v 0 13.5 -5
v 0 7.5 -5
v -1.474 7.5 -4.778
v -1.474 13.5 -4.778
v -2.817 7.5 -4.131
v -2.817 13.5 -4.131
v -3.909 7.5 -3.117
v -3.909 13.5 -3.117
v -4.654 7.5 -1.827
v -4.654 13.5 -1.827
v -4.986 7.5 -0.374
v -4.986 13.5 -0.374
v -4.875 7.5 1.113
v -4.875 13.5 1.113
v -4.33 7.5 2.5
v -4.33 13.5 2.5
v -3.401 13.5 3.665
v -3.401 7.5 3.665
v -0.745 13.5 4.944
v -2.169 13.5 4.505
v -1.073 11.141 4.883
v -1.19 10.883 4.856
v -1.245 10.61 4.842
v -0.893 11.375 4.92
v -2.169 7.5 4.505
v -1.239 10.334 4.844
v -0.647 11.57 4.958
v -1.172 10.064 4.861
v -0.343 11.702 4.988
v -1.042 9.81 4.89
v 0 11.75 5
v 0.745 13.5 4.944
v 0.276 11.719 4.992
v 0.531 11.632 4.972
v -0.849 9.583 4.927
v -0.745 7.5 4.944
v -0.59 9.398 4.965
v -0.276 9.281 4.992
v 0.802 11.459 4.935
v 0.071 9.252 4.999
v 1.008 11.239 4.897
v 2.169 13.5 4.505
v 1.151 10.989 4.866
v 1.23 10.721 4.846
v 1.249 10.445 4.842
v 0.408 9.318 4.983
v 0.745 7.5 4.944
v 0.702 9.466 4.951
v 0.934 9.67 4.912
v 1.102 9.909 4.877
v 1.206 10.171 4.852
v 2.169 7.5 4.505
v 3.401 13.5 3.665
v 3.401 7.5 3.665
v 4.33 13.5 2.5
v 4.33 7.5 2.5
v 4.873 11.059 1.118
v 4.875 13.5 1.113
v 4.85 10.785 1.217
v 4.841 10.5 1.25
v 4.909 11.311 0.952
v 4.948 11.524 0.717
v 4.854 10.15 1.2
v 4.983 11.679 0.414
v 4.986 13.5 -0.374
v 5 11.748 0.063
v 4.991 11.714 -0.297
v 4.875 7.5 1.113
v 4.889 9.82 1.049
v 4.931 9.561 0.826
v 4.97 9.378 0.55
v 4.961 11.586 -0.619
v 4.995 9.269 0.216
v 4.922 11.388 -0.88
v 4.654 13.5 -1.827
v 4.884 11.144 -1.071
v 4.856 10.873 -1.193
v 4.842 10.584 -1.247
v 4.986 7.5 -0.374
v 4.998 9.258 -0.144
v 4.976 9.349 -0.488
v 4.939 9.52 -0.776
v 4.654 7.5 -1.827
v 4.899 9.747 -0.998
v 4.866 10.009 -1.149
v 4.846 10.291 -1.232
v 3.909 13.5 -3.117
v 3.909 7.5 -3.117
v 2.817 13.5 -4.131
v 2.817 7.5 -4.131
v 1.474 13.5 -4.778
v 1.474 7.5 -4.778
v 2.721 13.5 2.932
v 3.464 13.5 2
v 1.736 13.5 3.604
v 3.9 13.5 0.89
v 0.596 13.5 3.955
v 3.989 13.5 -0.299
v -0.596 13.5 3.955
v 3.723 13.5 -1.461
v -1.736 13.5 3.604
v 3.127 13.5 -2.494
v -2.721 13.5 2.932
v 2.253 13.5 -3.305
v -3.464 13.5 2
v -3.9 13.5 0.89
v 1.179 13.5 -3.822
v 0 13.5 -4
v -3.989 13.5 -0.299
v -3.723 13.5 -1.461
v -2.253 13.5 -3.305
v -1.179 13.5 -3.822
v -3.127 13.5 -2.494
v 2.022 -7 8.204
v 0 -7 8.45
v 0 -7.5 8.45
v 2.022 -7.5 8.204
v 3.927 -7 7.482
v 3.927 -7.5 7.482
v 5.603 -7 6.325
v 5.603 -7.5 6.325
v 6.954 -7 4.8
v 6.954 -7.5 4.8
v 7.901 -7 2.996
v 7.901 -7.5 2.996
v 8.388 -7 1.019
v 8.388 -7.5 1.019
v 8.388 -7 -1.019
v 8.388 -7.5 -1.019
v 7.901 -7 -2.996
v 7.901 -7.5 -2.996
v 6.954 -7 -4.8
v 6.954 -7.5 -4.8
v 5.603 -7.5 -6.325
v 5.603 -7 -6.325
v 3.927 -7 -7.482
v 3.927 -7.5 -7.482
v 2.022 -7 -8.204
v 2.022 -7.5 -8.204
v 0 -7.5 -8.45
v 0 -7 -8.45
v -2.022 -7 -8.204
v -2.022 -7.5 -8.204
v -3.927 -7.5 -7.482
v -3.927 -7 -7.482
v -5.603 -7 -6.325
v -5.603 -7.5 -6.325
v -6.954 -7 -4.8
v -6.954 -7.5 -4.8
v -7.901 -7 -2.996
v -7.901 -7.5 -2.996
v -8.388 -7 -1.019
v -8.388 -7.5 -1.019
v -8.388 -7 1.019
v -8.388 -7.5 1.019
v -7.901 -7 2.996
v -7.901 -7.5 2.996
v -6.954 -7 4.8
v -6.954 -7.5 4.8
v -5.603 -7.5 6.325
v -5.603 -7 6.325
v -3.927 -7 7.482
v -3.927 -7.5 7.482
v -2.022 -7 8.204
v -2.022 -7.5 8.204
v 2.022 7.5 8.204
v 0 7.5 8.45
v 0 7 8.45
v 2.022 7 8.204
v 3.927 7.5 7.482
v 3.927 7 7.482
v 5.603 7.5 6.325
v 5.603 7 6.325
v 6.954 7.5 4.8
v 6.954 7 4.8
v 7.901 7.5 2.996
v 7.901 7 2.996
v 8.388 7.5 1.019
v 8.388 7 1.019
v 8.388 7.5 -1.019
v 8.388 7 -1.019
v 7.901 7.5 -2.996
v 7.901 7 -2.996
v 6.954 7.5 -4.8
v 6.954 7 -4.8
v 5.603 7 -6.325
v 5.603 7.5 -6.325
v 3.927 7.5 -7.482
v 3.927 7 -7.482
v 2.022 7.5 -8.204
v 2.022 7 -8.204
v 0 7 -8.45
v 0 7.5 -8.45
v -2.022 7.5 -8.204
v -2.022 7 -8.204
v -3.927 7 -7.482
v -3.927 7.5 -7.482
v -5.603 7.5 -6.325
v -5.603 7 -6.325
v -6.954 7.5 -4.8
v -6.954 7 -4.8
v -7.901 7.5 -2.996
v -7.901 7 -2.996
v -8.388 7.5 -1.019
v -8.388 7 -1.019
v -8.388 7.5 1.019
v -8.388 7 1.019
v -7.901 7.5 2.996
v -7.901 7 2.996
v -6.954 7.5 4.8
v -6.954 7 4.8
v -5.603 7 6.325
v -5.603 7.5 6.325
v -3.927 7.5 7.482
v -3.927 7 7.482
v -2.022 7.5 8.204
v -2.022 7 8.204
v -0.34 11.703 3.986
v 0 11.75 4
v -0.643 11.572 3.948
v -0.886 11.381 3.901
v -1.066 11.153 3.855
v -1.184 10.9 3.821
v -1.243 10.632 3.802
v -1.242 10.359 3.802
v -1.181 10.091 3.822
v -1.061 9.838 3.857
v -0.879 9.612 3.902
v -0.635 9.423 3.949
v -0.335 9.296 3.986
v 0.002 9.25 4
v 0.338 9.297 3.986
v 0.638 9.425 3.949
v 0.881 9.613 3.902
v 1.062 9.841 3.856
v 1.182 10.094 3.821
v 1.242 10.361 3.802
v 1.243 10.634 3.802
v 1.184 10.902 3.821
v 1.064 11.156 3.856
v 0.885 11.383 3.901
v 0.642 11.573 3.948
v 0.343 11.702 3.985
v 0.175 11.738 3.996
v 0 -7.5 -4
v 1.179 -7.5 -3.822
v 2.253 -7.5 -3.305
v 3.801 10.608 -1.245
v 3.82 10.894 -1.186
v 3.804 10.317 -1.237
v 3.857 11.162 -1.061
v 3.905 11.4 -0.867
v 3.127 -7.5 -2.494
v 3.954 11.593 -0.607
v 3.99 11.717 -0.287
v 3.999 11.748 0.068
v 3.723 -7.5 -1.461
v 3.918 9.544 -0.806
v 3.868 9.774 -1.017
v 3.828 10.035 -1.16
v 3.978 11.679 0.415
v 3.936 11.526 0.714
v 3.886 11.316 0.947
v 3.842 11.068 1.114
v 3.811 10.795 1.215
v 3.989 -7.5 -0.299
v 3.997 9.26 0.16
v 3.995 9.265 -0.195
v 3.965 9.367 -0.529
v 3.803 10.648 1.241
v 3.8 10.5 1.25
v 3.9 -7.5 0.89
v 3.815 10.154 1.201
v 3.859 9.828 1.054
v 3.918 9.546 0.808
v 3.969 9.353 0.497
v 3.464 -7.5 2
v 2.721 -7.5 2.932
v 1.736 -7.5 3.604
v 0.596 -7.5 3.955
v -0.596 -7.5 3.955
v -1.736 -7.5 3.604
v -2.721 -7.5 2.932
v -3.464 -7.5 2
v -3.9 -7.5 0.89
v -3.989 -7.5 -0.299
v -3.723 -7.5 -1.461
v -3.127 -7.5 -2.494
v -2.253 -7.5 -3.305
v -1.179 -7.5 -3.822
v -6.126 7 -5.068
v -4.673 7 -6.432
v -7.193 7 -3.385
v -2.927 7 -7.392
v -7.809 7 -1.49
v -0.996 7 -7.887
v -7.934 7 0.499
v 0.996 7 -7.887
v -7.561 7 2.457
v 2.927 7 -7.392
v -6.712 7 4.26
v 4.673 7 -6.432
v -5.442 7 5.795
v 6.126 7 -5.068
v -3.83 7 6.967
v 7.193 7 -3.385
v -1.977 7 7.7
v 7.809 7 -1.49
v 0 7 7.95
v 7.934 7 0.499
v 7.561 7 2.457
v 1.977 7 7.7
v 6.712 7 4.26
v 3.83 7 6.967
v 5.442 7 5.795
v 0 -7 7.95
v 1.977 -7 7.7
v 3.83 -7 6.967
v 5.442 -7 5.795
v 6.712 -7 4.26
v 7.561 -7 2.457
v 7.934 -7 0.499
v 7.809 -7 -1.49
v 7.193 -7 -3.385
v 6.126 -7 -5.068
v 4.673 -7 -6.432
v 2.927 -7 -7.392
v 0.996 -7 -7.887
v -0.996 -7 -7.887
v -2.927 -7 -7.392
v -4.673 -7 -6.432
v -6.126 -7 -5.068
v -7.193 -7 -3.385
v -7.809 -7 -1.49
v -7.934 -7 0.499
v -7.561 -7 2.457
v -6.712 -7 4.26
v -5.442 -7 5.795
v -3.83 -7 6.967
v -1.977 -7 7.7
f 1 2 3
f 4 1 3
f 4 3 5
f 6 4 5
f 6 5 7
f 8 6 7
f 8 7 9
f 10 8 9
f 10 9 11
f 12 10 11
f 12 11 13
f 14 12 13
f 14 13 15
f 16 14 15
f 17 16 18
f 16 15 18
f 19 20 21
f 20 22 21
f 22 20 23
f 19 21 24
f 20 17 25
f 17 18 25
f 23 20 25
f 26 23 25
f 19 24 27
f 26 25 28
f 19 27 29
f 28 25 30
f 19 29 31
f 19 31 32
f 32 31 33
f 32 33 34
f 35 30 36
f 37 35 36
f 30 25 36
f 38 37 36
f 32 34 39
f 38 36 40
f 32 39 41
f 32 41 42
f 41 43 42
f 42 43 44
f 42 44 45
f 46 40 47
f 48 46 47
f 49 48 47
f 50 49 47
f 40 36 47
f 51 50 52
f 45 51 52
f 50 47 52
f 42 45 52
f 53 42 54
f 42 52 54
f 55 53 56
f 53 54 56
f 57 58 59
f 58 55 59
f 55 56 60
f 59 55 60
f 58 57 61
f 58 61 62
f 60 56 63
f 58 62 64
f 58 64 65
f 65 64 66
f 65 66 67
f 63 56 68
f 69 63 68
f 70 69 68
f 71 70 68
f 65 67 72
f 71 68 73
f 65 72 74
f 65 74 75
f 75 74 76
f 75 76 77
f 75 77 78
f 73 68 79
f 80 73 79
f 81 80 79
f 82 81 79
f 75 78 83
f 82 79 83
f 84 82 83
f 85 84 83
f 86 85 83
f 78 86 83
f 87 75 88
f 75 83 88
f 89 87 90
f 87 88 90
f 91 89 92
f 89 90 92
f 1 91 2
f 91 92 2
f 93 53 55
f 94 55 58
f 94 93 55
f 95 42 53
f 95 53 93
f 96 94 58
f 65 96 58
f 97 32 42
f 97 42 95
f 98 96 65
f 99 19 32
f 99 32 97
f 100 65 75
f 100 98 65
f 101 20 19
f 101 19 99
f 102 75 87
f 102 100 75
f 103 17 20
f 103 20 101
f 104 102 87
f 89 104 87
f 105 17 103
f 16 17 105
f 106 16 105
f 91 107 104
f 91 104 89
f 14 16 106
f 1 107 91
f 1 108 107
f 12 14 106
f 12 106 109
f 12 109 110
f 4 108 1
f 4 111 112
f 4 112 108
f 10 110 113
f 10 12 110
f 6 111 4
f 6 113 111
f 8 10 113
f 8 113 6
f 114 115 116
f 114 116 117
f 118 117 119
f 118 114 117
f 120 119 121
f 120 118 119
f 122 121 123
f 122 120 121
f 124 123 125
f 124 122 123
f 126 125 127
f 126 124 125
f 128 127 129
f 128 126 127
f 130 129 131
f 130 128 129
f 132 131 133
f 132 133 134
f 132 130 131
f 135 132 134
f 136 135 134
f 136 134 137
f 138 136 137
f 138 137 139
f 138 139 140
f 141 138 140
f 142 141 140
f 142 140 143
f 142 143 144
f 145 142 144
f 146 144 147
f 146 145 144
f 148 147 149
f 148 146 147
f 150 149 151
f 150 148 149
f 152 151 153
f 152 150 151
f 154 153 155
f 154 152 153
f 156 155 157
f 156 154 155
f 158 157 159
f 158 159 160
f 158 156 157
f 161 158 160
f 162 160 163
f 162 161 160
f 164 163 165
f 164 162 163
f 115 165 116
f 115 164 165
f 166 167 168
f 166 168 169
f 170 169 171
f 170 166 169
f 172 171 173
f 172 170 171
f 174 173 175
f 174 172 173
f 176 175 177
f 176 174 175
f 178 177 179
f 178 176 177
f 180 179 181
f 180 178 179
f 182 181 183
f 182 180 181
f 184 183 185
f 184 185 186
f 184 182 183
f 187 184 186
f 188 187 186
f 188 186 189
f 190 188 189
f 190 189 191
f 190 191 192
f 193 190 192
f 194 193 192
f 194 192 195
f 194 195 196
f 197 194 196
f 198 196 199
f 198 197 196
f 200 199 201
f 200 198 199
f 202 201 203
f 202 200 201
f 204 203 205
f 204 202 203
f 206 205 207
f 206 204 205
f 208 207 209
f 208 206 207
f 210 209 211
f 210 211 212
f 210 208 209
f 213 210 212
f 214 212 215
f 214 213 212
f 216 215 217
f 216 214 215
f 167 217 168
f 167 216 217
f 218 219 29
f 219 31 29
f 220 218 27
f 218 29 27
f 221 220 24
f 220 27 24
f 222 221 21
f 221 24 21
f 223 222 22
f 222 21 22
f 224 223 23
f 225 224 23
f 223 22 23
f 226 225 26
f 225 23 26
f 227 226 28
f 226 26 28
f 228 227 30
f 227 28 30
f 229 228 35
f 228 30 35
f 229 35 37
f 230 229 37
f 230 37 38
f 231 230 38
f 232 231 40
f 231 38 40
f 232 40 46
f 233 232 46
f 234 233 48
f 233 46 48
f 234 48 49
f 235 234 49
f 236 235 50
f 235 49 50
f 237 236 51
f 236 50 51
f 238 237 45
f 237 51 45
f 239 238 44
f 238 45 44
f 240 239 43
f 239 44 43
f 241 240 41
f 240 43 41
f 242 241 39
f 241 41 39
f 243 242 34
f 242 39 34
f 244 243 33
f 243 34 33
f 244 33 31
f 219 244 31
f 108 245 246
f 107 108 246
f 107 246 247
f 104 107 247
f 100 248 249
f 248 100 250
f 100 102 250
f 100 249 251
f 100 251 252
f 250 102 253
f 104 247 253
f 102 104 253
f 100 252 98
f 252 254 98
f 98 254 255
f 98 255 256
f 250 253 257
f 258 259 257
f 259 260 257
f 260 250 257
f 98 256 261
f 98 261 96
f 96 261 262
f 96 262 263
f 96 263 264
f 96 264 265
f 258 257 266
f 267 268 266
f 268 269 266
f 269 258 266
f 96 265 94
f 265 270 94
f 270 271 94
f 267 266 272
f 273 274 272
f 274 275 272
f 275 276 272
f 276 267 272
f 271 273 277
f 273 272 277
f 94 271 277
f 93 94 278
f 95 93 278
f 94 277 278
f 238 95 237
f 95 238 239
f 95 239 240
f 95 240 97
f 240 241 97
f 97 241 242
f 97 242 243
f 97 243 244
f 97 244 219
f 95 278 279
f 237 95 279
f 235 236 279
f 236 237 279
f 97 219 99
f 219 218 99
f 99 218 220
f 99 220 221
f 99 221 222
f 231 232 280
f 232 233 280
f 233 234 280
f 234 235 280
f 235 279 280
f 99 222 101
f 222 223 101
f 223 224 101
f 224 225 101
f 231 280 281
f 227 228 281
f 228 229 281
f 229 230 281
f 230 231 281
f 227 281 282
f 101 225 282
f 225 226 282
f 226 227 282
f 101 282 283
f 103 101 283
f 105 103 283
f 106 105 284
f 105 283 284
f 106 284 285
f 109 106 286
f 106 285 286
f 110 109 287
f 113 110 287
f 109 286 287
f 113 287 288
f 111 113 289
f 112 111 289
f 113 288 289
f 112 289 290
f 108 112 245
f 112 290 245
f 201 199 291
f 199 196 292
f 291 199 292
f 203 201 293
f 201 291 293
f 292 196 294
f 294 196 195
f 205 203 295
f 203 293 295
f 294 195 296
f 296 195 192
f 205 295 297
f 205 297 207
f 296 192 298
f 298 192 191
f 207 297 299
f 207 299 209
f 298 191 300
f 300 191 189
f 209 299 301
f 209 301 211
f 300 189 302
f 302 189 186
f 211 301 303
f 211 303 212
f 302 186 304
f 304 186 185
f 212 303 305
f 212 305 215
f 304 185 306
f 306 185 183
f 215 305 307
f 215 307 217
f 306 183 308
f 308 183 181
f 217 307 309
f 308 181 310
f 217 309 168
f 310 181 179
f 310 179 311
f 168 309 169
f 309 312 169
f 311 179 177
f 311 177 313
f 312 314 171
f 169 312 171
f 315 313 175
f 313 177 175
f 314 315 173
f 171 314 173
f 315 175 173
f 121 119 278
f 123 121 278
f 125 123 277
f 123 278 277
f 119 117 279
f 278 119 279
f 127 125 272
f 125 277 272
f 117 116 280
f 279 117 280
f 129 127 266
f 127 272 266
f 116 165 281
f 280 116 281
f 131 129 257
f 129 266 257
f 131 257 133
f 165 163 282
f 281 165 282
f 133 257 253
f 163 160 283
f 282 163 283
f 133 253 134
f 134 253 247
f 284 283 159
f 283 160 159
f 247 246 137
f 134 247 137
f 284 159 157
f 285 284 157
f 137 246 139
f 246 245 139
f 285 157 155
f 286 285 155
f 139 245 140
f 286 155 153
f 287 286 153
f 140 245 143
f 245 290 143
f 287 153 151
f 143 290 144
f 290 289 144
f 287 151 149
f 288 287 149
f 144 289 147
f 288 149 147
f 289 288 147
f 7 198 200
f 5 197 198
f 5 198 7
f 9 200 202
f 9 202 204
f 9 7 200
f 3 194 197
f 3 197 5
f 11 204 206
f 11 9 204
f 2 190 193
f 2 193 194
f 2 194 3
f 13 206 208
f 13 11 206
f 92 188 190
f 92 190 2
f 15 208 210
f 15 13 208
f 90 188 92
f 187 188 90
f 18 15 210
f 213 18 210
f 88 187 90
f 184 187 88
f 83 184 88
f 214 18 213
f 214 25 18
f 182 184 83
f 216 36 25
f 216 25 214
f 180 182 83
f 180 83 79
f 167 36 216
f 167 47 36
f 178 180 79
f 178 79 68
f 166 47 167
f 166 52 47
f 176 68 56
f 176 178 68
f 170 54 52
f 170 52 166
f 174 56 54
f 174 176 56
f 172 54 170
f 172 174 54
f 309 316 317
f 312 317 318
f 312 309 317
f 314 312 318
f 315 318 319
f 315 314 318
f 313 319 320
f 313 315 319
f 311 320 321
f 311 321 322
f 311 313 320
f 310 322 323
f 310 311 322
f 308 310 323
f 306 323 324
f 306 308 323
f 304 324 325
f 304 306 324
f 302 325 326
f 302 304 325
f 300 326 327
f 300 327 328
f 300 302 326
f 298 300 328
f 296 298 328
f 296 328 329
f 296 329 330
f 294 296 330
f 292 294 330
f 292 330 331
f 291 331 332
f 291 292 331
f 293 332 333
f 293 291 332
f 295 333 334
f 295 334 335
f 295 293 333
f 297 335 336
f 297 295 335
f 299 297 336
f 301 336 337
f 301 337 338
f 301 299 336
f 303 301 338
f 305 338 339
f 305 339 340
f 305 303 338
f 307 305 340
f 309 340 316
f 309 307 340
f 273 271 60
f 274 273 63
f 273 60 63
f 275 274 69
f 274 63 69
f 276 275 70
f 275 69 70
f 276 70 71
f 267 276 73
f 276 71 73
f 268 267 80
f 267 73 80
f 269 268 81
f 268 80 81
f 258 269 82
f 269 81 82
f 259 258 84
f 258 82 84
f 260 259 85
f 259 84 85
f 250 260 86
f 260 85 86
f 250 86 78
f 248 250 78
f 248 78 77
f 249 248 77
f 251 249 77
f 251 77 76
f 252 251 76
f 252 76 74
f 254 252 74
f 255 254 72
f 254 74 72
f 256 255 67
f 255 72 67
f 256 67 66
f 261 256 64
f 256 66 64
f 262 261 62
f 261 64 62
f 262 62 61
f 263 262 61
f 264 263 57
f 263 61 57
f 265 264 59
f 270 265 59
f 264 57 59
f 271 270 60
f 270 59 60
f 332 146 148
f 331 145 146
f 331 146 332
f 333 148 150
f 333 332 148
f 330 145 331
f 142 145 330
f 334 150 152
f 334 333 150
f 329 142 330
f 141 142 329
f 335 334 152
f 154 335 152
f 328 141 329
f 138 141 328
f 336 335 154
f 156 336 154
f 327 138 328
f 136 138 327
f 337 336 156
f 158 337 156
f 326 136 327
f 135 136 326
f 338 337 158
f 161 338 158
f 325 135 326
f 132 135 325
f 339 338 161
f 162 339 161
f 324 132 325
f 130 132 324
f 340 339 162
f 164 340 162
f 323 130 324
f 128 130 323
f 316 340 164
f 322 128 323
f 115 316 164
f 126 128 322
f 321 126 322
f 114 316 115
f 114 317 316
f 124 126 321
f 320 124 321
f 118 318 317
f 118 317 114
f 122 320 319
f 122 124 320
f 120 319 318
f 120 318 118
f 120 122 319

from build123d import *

# Parameters (mm, degrees)
CROQUIS1_R                 = 7.95
SALIENTE_EXTRUIR1_DEPTH    = 7.5
CROQUIS2_R                 = 8.45
SALIENTE_EXTRUIR2_DEPTH    = 0.5
SALIENTE_EXTRUIR3_START    = -14.5
CROQUIS2_2_R               = 8.45
SALIENTE_EXTRUIR3_DEPTH    = 0.5
CROQUIS3_R                 = 5
SALIENTE_EXTRUIR4_DEPTH    = 21
CORTAR_EXTRUIR1_DEPTH      = 24.728779994
CORTAR_EXTRUIR1_DEPTH_BACK = 24.728779994
CROQUIS4_R                 = 3
CROQUIS7_W                 = 1.25
CROQUIS7_H                 = 5
CROQUIS9_W                 = 1.25
CROQUIS9_H                 = 8.45
CROQUIS10_R                = 4
CORTAR_EXTRUIR2_DEPTH      = 25.162057119


with BuildPart() as part:
    # Croquis1 → Saliente-Extruir1 (new, symmetric)
    with BuildSketch(Plane(origin=(0, 0, 0), x_dir=(-1, 0, 0), z_dir=(0, 1, 0))):
        with Locations(Location((0, 0, 0), (0, 0, 90))):
            Circle(CROQUIS1_R)
    extrude(amount=SALIENTE_EXTRUIR1_DEPTH, both=True)

    # Croquis2 → Saliente-Extruir2 (add)
    with BuildSketch(Plane(origin=(0, 7.5, 0), x_dir=(-1, 0, 0), z_dir=(0, 1, 0))):
        with Locations(Location((0, 0, 0), (0, 0, 90))):
            Circle(CROQUIS2_R)
    extrude(amount=-SALIENTE_EXTRUIR2_DEPTH)

    # Croquis2<2> → Saliente-Extruir3 (add)
    with BuildSketch(Plane(origin=(0, 7.5, 0), x_dir=(-1, 0, 0), z_dir=(0, 1, 0)).offset(SALIENTE_EXTRUIR3_START)):
        with Locations(Location((0, 0, 0), (0, 0, 90))):
            Circle(CROQUIS2_2_R)
    extrude(amount=-SALIENTE_EXTRUIR3_DEPTH)

    # Croquis3 → Saliente-Extruir4 (add)
    with BuildSketch(Plane(origin=(0, -7.5, 0), x_dir=(-1, 0, 0), z_dir=(0, 1, 0))):
        with Locations(Location((0, 0, 0), (0, 0, 270))):
            Circle(CROQUIS3_R)
    extrude(amount=SALIENTE_EXTRUIR4_DEPTH)

    # Croquis4 → Cortar-Extruir1 (cut, two sides: drawn at the far end of the back side and taken through both)
    with BuildSketch(Plane(origin=(0, -7, 0), x_dir=(-1, 0, 0), z_dir=(0, 1, 0)).offset(-CORTAR_EXTRUIR1_DEPTH_BACK)):
        with Locations(Location((0, 0, 0), (0, 0, 90))):
            Circle(CROQUIS4_R)
    extrude(amount=CORTAR_EXTRUIR1_DEPTH + CORTAR_EXTRUIR1_DEPTH_BACK, mode=Mode.SUBTRACT)

    # Croquis7 → Taladro roscado M32 (revolve, cut)
    with BuildSketch(Plane.ZX.offset(10.5)):
        with Locations((0.625, 2.5)):
            Rectangle(CROQUIS7_W, CROQUIS7_H)
    revolve(axis=Axis((-6.35, 10.5, 0), (1, 0, 0)), mode=Mode.SUBTRACT)

    # Croquis9 → Taladro roscado M31 (revolve, cut)
    with BuildSketch(Plane(origin=(0, 10.5, 0), x_dir=(0, 1, 0), z_dir=(1, 0, 0))):
        with Locations((0.625, 4.225)):
            Rectangle(CROQUIS9_W, CROQUIS9_H)
    revolve(axis=Axis((0, 10.5, -6.35), (0, 0, 1)), mode=Mode.SUBTRACT)

    # Croquis10 → Cortar-Extruir2 (cut, through all)
    with BuildSketch(Plane.XZ.offset(7.5)):
        with Locations(Location((0, 0, 0), (0, 0, 270))):
            Circle(CROQUIS10_R)
    extrude(amount=-CORTAR_EXTRUIR2_DEPTH, mode=Mode.SUBTRACT)


solid = part.part
